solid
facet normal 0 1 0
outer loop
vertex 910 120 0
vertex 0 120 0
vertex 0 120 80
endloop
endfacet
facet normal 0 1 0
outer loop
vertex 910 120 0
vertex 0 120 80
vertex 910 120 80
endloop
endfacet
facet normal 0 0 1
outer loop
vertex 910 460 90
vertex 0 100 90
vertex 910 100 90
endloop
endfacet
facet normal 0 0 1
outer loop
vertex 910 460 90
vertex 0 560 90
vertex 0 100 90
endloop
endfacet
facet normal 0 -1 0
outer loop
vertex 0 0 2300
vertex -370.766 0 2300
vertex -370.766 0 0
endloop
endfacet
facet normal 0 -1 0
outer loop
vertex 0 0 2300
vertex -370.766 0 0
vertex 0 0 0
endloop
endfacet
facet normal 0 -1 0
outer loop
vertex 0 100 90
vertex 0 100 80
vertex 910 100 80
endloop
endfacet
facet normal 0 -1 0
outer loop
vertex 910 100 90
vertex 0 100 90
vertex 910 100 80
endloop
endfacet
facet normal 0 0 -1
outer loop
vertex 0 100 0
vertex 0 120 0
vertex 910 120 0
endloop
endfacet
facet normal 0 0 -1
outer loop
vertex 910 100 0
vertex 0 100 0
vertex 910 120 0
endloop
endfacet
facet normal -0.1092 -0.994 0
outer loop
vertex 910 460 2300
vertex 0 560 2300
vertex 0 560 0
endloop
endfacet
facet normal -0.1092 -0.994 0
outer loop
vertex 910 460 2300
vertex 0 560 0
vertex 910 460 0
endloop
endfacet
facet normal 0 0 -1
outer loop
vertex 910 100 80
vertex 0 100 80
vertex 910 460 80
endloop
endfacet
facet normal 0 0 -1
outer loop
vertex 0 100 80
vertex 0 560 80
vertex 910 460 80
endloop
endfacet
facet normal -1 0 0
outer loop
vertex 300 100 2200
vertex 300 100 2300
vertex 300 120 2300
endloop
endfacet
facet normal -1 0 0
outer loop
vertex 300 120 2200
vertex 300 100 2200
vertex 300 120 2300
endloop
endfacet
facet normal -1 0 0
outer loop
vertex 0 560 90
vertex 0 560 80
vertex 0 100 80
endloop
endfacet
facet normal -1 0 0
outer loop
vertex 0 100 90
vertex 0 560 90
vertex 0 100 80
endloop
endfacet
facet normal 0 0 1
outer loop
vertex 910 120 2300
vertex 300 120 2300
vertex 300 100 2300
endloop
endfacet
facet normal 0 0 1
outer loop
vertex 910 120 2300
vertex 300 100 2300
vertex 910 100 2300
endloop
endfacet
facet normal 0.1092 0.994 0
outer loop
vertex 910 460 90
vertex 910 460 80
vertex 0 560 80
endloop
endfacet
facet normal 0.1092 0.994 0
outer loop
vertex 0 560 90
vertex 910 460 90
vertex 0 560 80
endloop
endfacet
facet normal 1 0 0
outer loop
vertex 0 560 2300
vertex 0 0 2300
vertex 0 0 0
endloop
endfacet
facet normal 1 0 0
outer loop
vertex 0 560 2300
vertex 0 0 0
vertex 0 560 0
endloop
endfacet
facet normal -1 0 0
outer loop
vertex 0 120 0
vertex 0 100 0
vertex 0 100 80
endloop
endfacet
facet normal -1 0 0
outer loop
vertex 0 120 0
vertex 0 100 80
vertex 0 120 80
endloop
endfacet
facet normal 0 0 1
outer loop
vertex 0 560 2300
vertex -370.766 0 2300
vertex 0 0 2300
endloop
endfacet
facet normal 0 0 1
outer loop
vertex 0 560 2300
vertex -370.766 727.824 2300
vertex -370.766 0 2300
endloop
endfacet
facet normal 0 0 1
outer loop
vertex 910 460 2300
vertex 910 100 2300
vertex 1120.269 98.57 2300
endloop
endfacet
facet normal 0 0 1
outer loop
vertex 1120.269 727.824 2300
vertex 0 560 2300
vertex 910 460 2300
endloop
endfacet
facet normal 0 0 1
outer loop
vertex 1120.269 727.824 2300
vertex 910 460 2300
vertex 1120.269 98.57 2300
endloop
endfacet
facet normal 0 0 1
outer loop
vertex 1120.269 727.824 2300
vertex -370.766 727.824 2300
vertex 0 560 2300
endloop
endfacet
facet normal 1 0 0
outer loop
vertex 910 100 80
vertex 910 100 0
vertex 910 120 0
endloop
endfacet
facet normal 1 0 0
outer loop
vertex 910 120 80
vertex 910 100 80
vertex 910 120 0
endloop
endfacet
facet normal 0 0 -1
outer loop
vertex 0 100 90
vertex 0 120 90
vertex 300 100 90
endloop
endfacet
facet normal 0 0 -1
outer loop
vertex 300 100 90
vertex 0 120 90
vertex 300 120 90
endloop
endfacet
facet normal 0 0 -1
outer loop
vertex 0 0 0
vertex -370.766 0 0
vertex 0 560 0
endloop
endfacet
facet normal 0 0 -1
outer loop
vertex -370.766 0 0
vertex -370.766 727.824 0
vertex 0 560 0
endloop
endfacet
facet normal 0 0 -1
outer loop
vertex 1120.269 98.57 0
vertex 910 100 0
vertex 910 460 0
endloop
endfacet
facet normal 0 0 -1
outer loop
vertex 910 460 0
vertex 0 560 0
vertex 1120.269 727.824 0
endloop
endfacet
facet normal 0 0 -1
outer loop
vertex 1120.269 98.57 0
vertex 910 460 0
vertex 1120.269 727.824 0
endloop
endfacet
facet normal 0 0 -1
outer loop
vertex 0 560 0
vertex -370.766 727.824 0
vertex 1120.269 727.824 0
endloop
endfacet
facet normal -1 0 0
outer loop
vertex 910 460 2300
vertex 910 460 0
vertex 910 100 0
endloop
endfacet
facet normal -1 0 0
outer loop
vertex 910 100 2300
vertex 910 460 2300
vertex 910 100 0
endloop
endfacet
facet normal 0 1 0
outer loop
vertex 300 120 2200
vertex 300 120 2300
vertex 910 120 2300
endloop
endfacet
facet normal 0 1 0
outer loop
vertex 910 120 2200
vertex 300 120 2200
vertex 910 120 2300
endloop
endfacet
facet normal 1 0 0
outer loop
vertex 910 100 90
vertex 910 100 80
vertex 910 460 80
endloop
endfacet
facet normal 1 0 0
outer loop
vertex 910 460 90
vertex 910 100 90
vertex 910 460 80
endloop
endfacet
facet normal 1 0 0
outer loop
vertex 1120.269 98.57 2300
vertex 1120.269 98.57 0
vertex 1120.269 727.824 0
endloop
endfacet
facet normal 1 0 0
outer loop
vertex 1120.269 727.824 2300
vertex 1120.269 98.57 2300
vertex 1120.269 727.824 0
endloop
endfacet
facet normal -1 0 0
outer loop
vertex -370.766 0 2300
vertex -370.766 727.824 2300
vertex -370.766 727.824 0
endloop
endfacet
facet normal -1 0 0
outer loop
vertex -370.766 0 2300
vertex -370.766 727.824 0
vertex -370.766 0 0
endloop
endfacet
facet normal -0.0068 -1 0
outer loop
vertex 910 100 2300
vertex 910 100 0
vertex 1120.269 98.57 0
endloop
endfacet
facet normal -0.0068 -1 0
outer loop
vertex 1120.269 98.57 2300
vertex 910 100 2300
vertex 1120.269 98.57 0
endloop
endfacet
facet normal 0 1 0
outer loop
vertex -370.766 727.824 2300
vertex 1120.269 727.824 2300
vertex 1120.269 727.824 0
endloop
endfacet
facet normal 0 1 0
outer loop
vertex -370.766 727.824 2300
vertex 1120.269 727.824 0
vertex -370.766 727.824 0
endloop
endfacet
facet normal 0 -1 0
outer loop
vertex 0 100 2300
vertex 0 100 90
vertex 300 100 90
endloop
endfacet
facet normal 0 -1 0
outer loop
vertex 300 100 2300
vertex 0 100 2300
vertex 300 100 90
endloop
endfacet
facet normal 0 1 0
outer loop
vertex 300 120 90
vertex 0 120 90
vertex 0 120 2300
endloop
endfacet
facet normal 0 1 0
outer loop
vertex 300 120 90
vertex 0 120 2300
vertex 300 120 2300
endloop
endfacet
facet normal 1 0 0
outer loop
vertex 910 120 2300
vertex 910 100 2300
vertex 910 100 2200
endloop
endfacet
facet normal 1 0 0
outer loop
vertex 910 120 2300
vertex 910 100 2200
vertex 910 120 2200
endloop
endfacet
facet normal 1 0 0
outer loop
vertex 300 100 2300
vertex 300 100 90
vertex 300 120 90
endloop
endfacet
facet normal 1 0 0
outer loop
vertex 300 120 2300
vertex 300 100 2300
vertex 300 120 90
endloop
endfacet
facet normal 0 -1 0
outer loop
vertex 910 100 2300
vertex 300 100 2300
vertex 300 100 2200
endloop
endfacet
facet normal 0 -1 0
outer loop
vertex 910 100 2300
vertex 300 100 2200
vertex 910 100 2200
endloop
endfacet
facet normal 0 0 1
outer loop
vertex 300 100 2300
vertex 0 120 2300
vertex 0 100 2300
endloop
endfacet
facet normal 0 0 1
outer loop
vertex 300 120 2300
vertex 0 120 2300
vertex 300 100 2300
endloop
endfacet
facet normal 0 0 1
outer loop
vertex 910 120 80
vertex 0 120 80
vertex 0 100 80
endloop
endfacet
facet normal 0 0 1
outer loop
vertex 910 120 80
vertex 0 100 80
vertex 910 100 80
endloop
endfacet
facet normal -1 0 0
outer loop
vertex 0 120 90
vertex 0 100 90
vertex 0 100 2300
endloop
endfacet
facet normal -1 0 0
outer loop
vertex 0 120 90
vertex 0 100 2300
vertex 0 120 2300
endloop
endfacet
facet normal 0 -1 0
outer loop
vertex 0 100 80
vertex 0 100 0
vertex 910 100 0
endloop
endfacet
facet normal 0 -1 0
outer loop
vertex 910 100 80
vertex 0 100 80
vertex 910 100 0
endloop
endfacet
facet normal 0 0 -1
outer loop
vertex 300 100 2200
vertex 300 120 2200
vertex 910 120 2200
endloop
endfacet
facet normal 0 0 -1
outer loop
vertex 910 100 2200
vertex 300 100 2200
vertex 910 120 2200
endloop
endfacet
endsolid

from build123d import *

# Parameters (mm, degrees)
F1_DEPTH = 2300
F2_W     = 910
F2_H     = 20
F3_DEPTH = 80
F5_DEPTH = 10
F6_W     = 300
F6_H     = 20
F7_DEPTH = 2210
F8_W     = 610
F8_H     = 20
F9_DEPTH = 100


with BuildPart() as f1:
    # F0 (on Top) → F1 (new body)
    with BuildSketch(Plane.XY):
        Polygon((-370.7656, 0), (0, 0), (0, 560), (910, 460), (910, 100), (1120.269371, 98.569595), (1120.269371, 727.823936), (-370.7656, 727.823936), align=None)
    extrude(amount=F1_DEPTH)


with BuildPart() as f3:
    # F2 (on Top) → F3 (new body)
    with BuildSketch(Plane.XY):
        with Locations((455, 110)):
            Rectangle(F2_W, F2_H)
    extrude(amount=F3_DEPTH)


with BuildPart() as f5:
    # F4 (on face) → F5 (new body)
    with BuildSketch(Plane.XY.offset(80)):
        Polygon((0, 100), (910, 100), (910, 460), (0, 560), align=None)
    extrude(amount=F5_DEPTH)


with BuildPart() as f7:
    # F6 (on face) → F7 (new body, through all)
    with BuildSketch(Plane.XY.offset(90)):
        with Locations((150, 110)):
            Rectangle(F6_W, F6_H)
    extrude(amount=F7_DEPTH)


with BuildPart() as f9:
    # F8 (on face) → F9 (new body)
    with BuildSketch(Plane.XY.offset(2300)):
        with Locations((605, 110)):
            Rectangle(F8_W, F8_H)
    extrude(amount=-F9_DEPTH)


solid = Compound([f1.part, f3.part, f5.part, f7.part, f9.part])
